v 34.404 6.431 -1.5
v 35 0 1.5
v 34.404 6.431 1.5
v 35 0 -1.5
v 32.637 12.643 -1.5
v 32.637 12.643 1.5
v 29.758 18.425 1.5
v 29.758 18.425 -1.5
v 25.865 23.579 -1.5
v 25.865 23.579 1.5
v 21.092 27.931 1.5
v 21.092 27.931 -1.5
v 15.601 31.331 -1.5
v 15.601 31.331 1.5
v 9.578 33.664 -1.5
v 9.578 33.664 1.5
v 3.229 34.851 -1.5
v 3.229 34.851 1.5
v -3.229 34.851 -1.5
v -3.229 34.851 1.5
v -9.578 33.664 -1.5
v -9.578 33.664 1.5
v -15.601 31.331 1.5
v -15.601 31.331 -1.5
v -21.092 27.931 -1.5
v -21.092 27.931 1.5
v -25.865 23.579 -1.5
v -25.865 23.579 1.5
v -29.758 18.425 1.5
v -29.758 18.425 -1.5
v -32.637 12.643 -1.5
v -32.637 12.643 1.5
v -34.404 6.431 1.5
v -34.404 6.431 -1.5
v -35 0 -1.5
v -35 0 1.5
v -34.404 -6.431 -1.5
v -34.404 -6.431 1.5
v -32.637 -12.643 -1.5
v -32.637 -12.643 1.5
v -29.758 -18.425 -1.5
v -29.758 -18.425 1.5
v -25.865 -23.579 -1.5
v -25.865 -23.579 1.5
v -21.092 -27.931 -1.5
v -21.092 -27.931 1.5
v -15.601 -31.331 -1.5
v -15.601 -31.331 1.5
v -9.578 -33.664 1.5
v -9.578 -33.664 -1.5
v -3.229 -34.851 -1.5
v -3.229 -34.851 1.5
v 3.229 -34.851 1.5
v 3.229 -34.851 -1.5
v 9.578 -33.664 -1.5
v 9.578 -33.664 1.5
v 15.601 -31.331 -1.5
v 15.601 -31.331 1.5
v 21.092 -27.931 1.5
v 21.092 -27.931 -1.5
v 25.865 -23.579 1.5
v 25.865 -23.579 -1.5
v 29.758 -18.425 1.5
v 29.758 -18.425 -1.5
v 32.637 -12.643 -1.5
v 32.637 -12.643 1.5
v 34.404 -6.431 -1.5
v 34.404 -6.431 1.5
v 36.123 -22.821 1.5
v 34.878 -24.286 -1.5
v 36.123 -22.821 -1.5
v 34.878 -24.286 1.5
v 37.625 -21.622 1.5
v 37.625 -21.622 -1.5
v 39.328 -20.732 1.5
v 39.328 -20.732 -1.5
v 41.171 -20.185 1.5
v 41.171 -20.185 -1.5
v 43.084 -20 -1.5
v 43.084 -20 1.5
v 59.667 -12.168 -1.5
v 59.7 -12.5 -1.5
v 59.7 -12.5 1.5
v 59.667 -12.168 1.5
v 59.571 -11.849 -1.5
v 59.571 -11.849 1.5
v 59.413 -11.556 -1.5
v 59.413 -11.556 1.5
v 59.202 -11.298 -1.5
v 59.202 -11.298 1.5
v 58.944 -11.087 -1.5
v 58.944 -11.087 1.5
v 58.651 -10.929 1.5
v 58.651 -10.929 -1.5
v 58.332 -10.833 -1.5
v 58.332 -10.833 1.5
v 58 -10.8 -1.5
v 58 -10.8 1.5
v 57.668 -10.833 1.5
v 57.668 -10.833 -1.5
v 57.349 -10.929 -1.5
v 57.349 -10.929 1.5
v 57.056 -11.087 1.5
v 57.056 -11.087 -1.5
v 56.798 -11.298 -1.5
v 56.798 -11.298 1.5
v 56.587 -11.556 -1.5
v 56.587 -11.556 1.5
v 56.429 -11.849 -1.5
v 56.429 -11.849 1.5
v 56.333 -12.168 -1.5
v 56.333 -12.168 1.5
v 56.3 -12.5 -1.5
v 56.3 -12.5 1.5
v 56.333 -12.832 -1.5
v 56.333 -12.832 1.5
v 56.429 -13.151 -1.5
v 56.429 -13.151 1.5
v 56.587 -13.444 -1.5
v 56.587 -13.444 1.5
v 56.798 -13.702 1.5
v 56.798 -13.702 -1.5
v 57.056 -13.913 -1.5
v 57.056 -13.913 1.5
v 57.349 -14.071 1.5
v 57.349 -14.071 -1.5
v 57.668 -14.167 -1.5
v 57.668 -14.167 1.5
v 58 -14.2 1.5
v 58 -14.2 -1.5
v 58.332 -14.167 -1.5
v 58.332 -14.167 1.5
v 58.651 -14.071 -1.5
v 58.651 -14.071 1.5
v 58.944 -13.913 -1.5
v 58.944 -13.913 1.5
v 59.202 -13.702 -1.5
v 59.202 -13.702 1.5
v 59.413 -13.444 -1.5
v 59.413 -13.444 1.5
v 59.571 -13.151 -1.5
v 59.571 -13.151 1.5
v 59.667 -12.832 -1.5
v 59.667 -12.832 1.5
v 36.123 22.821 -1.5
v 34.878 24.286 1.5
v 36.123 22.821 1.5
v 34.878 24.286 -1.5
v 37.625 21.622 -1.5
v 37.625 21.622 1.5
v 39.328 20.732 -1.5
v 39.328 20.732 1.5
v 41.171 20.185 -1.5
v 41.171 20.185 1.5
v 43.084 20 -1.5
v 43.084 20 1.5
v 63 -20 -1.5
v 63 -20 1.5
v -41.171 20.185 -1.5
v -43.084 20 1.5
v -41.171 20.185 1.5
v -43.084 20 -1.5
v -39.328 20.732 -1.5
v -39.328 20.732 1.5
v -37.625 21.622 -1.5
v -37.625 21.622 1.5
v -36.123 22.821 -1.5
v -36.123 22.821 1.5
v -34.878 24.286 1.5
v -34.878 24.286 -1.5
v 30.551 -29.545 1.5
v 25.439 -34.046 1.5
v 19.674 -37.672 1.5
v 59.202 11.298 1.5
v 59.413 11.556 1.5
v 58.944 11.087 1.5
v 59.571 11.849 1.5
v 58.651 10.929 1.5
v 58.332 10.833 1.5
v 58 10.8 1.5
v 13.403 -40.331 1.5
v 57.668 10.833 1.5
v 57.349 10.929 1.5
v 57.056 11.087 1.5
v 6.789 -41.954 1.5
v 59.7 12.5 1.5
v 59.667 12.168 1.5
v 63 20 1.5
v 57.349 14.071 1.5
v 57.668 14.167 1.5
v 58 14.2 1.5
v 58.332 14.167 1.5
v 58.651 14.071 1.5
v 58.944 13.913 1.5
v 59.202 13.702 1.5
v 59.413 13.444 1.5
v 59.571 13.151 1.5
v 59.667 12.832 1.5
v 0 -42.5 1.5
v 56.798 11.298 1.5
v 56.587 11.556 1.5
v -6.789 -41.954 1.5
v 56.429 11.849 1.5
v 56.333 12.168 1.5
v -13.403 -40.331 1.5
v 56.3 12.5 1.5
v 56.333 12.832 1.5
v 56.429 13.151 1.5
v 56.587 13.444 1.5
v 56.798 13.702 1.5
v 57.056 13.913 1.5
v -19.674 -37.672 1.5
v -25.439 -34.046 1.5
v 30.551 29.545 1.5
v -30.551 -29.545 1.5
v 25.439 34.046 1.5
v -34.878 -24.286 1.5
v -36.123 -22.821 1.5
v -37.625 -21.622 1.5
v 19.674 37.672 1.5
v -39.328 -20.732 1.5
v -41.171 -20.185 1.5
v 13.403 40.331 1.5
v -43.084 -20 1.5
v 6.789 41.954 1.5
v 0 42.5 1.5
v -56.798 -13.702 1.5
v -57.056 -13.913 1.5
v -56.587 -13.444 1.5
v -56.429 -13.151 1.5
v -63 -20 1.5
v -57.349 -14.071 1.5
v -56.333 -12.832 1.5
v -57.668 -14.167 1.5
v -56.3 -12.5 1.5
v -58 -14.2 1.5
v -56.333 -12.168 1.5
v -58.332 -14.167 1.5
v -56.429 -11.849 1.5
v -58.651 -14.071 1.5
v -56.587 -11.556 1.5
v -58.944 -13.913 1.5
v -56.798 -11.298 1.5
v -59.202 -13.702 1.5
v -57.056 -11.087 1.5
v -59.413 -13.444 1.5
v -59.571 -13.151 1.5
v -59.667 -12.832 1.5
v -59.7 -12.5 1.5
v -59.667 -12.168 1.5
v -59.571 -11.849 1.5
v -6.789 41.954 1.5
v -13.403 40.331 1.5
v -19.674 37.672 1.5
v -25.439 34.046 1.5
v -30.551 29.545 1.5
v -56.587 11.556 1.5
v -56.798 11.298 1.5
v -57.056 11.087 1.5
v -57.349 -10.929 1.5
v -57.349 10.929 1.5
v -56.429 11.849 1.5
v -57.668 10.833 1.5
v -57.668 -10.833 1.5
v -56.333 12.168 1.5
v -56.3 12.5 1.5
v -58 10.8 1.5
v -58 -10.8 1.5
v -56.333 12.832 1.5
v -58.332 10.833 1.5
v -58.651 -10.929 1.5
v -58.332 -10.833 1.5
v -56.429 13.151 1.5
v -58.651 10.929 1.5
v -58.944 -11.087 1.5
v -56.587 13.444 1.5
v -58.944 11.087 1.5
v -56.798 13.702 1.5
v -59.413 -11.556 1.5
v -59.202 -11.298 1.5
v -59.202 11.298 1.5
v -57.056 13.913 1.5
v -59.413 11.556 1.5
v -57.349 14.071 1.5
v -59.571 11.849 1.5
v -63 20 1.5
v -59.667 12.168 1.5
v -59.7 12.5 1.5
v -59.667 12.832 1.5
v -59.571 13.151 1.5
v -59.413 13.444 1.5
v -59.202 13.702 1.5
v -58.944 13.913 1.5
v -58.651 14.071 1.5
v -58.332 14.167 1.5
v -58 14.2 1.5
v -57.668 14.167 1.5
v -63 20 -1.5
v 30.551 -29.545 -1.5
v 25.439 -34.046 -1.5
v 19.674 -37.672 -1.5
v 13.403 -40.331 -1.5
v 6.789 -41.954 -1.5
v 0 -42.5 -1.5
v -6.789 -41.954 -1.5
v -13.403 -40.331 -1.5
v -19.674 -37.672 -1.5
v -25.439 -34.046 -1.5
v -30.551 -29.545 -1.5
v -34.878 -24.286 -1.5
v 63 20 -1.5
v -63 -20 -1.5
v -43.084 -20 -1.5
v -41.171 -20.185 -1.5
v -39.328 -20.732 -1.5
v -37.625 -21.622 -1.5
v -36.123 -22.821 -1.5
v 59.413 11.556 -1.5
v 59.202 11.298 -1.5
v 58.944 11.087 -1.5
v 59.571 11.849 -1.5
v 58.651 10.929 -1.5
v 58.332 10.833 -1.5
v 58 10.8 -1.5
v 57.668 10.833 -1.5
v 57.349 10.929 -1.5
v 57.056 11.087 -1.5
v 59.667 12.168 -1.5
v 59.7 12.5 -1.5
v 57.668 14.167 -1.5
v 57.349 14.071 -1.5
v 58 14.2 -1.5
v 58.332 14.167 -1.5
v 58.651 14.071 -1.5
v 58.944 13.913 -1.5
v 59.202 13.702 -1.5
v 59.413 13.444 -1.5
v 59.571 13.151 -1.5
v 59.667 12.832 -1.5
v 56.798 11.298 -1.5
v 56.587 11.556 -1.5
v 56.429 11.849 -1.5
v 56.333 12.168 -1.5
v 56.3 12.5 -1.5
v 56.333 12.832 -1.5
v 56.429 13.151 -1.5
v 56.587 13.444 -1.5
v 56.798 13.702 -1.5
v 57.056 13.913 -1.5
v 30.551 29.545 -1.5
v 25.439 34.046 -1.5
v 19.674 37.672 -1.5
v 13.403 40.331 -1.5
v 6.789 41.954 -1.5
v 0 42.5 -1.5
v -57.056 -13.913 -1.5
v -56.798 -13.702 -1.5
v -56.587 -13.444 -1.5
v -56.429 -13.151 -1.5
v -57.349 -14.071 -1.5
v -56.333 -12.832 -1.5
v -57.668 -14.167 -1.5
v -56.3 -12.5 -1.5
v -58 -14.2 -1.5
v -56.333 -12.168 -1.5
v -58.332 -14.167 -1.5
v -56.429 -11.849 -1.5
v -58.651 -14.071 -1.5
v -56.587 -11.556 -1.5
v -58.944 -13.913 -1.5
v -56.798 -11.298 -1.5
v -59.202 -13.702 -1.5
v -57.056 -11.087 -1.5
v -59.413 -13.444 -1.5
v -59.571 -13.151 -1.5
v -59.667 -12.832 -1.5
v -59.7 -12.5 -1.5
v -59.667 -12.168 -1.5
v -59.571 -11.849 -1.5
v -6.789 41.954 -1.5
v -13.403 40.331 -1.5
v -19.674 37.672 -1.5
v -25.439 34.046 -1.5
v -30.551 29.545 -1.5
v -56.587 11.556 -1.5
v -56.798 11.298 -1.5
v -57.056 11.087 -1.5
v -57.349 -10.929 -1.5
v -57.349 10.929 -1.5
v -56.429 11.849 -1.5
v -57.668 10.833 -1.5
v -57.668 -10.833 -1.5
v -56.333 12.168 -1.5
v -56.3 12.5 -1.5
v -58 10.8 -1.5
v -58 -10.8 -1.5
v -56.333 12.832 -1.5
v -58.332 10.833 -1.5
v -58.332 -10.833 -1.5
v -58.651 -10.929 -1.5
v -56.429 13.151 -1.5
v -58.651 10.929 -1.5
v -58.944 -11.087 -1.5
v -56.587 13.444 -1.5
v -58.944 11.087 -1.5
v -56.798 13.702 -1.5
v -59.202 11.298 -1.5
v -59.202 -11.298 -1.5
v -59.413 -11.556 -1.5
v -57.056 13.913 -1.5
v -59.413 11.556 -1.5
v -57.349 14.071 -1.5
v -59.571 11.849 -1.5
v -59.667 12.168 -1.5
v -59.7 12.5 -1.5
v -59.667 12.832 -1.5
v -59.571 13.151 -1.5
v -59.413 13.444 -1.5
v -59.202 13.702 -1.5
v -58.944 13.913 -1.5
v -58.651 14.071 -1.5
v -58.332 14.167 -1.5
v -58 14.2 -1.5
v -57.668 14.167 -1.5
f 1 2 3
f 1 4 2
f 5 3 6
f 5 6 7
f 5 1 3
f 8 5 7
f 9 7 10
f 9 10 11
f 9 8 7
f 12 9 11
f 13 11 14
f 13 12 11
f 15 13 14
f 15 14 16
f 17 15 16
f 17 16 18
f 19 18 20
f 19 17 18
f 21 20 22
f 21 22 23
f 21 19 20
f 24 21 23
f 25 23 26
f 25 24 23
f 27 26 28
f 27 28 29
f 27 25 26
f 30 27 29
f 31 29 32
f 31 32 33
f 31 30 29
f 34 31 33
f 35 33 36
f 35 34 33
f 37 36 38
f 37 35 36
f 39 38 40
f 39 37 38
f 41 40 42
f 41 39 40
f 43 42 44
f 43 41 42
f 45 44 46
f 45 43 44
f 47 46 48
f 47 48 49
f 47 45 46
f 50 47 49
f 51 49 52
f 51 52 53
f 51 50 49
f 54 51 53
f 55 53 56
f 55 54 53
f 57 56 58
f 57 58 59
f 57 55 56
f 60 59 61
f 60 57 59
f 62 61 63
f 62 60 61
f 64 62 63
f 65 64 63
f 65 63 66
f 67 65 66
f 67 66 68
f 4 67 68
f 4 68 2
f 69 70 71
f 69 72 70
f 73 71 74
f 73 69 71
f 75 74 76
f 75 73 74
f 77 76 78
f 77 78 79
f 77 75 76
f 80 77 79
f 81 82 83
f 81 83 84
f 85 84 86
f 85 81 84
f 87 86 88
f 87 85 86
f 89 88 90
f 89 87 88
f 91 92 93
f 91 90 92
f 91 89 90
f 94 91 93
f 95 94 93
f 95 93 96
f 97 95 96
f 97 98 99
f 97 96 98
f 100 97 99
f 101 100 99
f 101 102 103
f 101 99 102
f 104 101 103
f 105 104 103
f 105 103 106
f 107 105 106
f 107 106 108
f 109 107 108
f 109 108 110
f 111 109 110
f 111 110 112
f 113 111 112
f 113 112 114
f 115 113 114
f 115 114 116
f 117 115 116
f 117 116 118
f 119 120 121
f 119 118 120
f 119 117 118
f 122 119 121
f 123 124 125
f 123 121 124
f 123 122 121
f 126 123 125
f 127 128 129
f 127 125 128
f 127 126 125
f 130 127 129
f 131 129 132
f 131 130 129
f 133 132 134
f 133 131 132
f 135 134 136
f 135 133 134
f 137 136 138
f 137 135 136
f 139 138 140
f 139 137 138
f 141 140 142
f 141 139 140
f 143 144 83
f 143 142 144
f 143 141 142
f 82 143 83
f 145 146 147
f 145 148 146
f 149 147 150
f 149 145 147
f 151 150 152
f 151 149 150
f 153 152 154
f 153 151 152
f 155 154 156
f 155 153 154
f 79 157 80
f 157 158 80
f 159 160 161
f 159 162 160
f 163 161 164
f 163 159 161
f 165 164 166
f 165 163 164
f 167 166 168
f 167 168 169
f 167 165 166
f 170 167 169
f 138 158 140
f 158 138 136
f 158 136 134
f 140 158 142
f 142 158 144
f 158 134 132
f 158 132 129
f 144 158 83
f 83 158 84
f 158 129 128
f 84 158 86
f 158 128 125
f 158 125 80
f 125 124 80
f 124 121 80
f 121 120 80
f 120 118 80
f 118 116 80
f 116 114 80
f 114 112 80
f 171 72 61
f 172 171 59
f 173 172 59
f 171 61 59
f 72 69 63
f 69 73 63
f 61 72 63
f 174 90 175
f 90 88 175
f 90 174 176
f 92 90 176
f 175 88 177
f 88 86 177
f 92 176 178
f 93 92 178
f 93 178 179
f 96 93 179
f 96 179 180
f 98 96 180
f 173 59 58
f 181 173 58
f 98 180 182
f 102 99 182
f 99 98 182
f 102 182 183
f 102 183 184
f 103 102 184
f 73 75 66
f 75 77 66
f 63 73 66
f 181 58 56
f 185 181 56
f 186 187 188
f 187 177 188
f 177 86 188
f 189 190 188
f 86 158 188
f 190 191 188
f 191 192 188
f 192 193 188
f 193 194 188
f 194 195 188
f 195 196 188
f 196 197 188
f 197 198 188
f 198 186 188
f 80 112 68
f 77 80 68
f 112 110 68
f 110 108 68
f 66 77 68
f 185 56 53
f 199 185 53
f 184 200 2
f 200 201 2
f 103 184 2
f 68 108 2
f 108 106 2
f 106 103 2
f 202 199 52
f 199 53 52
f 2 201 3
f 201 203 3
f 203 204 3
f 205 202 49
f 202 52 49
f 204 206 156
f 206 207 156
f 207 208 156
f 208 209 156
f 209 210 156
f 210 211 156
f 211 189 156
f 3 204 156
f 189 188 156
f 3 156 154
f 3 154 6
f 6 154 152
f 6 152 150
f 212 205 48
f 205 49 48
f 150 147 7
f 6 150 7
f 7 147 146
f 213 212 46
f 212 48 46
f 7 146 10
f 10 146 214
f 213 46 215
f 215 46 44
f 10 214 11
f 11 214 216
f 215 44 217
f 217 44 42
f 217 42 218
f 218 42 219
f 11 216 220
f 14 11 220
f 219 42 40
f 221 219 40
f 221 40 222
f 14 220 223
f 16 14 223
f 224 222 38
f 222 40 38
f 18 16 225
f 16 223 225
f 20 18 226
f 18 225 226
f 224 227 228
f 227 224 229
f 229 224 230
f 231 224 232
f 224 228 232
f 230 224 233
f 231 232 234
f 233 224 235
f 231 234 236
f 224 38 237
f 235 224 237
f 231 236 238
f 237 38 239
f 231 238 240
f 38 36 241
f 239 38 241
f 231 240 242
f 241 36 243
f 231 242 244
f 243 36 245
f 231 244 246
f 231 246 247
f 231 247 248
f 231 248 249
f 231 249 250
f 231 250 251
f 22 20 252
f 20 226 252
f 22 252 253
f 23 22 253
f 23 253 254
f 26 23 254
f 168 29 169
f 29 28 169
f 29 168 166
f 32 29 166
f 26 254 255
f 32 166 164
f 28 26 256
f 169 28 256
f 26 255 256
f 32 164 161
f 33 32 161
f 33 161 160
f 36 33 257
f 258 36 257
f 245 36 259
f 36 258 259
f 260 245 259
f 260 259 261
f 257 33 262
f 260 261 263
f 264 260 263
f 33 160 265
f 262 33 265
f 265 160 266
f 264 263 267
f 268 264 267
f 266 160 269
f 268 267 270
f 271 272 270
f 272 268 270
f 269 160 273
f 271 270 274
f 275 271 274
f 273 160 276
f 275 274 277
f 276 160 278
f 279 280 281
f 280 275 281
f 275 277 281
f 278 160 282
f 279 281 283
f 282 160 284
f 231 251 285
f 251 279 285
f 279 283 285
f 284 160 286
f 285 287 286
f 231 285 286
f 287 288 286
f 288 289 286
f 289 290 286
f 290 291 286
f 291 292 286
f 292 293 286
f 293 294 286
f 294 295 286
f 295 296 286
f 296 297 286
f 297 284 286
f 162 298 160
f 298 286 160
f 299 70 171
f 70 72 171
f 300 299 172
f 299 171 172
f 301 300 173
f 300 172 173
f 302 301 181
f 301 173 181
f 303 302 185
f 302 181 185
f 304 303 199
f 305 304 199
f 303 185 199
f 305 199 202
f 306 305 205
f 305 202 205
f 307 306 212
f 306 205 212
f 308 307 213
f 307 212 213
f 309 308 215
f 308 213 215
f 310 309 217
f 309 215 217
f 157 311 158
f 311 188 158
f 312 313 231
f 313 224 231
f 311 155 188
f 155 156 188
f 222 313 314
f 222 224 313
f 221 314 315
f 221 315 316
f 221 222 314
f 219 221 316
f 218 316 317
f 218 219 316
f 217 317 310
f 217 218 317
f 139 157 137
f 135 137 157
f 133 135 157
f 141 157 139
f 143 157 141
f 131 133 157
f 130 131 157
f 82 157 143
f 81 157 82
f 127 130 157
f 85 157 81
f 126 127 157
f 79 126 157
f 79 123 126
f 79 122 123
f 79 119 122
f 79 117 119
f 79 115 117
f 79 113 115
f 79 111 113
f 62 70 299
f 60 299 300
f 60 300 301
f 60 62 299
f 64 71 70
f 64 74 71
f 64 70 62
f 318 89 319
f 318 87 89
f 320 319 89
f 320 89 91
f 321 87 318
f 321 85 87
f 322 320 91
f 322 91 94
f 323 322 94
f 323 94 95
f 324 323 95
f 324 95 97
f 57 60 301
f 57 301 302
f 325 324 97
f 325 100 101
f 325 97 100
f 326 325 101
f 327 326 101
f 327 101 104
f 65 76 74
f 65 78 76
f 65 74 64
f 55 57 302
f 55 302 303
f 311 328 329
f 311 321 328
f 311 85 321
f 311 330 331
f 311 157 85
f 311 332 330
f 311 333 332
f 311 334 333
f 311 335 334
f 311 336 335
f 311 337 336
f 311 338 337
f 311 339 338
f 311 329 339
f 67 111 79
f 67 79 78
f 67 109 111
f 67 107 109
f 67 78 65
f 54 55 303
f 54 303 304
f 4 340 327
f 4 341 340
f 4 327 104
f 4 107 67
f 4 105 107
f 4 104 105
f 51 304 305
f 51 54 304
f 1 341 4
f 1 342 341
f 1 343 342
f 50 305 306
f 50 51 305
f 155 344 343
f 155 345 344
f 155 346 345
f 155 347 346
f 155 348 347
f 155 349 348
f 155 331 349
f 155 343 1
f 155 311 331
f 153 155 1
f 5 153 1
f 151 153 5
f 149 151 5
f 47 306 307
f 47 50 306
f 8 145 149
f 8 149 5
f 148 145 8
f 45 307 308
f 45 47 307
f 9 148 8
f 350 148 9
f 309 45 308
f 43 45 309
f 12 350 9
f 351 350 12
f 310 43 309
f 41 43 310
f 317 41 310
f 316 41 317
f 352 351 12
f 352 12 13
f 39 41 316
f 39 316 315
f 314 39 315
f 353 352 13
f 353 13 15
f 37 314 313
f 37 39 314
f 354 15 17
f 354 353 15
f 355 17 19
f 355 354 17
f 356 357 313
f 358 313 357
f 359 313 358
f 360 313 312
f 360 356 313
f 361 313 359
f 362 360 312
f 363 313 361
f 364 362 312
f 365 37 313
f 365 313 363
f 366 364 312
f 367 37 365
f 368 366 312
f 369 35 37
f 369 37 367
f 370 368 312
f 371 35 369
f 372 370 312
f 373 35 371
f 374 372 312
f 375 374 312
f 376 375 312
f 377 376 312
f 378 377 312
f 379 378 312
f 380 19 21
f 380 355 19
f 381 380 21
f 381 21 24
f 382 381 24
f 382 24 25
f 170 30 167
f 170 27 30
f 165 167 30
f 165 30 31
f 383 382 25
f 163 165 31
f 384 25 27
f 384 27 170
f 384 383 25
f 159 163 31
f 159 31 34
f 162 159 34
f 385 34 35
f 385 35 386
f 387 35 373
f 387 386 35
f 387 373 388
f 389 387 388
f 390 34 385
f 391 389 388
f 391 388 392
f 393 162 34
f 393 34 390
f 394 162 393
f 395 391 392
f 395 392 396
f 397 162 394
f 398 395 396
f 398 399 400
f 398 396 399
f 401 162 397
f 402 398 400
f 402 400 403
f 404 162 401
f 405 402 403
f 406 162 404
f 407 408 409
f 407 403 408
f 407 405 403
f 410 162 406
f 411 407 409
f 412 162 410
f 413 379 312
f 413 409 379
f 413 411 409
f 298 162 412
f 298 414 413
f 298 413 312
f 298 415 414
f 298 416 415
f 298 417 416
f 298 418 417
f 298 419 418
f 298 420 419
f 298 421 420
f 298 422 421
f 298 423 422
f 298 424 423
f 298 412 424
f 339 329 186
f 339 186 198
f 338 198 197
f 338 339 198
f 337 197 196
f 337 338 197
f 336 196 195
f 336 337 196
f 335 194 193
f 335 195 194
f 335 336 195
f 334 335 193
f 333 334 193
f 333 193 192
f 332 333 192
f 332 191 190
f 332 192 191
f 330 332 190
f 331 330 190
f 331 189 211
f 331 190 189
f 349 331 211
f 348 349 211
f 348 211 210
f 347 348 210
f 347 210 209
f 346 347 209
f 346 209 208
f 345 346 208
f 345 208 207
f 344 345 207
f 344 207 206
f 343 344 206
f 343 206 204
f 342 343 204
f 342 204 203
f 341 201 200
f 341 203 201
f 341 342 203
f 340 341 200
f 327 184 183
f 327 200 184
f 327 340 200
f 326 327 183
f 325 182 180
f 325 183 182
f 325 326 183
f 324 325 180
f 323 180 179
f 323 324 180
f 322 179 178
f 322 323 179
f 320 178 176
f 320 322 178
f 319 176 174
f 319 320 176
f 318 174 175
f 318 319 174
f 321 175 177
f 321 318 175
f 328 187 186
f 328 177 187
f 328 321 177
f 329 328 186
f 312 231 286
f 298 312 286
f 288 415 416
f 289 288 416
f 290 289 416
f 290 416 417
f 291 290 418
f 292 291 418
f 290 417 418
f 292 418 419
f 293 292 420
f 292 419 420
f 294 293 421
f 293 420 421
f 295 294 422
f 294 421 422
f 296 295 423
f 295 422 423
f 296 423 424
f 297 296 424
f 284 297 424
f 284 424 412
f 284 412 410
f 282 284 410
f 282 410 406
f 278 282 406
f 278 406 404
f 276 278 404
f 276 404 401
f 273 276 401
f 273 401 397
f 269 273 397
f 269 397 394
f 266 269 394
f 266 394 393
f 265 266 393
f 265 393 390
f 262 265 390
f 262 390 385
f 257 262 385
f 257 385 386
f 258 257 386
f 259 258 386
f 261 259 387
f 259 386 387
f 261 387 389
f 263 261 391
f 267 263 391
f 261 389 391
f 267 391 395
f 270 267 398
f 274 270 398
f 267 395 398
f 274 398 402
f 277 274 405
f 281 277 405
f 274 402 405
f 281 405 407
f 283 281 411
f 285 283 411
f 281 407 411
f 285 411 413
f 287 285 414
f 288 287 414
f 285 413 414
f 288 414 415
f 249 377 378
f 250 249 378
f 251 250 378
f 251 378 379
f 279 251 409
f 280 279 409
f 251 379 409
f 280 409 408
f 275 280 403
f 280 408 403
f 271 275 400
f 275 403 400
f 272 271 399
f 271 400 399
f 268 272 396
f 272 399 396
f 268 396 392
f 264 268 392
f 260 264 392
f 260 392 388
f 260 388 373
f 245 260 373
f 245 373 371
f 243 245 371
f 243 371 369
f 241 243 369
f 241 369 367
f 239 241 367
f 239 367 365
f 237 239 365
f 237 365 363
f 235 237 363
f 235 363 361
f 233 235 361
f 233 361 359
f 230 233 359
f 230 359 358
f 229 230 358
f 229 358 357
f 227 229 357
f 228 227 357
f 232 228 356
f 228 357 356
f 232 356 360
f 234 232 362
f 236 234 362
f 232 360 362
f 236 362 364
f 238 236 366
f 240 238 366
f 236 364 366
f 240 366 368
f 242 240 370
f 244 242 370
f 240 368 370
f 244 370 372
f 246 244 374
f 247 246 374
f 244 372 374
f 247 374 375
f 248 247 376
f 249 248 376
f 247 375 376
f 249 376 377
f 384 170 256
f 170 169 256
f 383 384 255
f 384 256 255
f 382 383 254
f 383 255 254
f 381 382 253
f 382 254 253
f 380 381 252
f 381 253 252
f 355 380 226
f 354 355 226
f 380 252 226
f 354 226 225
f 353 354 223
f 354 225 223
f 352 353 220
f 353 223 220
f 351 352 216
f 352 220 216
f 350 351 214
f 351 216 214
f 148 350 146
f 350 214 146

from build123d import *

# Parameters (mm, degrees)
SKETCH1_R            = 35
BOSS_EXTRUDE1_DEPTH  = 1.5
M3_CLEARANCE_HOLE1_D = 3.4
FILLET1_R            = 10


with BuildPart() as part:
    # Sketch1 → Boss-Extrude1 (new, symmetric)
    with BuildSketch(Plane.XY):
        with BuildLine():
            Line((-63, 20), (-37.5, 20))
            ThreePointArc((-37.5, 20), (0, 42.5), (37.5, 20))
            Line((37.5, 20), (63, 20))
            Line((63, 20), (63, -20))
            Line((63, -20), (37.5, -20))
            ThreePointArc((37.5, -20), (0, -42.5), (-37.5, -20))
            Line((-37.5, -20), (-63, -20))
            Line((-63, -20), (-63, 20))
        make_face()
        Circle(SKETCH1_R, mode=Mode.SUBTRACT)
    extrude(amount=BOSS_EXTRUDE1_DEPTH, both=True)

    # M3 Clearance Hole1 (through all)
    with Locations(Plane.XY.offset(1.5)):
        with Locations((-58, 12.5), (-58, -12.5)):
            m3_clearance_hole1 = Hole(M3_CLEARANCE_HOLE1_D / 2)

    # Mirror1: M3 Clearance Hole1 across plane
    add(m3_clearance_hole1.mirror(Plane(origin=(0, 0, 0), x_dir=(0, 0, 1), z_dir=(1, 0, 0))), mode=Mode.SUBTRACT)

    # Fillet1
    fillet1_edges = [part.edges().sort_by_distance(p)[0] for p in [
        (37.5, 20, 0),
        (37.5, -20, 0),
        (-37.5, -20, 0),
        (-37.5, 20, 0),
    ]]
    fillet(fillet1_edges, radius=FILLET1_R)


solid = part.part
